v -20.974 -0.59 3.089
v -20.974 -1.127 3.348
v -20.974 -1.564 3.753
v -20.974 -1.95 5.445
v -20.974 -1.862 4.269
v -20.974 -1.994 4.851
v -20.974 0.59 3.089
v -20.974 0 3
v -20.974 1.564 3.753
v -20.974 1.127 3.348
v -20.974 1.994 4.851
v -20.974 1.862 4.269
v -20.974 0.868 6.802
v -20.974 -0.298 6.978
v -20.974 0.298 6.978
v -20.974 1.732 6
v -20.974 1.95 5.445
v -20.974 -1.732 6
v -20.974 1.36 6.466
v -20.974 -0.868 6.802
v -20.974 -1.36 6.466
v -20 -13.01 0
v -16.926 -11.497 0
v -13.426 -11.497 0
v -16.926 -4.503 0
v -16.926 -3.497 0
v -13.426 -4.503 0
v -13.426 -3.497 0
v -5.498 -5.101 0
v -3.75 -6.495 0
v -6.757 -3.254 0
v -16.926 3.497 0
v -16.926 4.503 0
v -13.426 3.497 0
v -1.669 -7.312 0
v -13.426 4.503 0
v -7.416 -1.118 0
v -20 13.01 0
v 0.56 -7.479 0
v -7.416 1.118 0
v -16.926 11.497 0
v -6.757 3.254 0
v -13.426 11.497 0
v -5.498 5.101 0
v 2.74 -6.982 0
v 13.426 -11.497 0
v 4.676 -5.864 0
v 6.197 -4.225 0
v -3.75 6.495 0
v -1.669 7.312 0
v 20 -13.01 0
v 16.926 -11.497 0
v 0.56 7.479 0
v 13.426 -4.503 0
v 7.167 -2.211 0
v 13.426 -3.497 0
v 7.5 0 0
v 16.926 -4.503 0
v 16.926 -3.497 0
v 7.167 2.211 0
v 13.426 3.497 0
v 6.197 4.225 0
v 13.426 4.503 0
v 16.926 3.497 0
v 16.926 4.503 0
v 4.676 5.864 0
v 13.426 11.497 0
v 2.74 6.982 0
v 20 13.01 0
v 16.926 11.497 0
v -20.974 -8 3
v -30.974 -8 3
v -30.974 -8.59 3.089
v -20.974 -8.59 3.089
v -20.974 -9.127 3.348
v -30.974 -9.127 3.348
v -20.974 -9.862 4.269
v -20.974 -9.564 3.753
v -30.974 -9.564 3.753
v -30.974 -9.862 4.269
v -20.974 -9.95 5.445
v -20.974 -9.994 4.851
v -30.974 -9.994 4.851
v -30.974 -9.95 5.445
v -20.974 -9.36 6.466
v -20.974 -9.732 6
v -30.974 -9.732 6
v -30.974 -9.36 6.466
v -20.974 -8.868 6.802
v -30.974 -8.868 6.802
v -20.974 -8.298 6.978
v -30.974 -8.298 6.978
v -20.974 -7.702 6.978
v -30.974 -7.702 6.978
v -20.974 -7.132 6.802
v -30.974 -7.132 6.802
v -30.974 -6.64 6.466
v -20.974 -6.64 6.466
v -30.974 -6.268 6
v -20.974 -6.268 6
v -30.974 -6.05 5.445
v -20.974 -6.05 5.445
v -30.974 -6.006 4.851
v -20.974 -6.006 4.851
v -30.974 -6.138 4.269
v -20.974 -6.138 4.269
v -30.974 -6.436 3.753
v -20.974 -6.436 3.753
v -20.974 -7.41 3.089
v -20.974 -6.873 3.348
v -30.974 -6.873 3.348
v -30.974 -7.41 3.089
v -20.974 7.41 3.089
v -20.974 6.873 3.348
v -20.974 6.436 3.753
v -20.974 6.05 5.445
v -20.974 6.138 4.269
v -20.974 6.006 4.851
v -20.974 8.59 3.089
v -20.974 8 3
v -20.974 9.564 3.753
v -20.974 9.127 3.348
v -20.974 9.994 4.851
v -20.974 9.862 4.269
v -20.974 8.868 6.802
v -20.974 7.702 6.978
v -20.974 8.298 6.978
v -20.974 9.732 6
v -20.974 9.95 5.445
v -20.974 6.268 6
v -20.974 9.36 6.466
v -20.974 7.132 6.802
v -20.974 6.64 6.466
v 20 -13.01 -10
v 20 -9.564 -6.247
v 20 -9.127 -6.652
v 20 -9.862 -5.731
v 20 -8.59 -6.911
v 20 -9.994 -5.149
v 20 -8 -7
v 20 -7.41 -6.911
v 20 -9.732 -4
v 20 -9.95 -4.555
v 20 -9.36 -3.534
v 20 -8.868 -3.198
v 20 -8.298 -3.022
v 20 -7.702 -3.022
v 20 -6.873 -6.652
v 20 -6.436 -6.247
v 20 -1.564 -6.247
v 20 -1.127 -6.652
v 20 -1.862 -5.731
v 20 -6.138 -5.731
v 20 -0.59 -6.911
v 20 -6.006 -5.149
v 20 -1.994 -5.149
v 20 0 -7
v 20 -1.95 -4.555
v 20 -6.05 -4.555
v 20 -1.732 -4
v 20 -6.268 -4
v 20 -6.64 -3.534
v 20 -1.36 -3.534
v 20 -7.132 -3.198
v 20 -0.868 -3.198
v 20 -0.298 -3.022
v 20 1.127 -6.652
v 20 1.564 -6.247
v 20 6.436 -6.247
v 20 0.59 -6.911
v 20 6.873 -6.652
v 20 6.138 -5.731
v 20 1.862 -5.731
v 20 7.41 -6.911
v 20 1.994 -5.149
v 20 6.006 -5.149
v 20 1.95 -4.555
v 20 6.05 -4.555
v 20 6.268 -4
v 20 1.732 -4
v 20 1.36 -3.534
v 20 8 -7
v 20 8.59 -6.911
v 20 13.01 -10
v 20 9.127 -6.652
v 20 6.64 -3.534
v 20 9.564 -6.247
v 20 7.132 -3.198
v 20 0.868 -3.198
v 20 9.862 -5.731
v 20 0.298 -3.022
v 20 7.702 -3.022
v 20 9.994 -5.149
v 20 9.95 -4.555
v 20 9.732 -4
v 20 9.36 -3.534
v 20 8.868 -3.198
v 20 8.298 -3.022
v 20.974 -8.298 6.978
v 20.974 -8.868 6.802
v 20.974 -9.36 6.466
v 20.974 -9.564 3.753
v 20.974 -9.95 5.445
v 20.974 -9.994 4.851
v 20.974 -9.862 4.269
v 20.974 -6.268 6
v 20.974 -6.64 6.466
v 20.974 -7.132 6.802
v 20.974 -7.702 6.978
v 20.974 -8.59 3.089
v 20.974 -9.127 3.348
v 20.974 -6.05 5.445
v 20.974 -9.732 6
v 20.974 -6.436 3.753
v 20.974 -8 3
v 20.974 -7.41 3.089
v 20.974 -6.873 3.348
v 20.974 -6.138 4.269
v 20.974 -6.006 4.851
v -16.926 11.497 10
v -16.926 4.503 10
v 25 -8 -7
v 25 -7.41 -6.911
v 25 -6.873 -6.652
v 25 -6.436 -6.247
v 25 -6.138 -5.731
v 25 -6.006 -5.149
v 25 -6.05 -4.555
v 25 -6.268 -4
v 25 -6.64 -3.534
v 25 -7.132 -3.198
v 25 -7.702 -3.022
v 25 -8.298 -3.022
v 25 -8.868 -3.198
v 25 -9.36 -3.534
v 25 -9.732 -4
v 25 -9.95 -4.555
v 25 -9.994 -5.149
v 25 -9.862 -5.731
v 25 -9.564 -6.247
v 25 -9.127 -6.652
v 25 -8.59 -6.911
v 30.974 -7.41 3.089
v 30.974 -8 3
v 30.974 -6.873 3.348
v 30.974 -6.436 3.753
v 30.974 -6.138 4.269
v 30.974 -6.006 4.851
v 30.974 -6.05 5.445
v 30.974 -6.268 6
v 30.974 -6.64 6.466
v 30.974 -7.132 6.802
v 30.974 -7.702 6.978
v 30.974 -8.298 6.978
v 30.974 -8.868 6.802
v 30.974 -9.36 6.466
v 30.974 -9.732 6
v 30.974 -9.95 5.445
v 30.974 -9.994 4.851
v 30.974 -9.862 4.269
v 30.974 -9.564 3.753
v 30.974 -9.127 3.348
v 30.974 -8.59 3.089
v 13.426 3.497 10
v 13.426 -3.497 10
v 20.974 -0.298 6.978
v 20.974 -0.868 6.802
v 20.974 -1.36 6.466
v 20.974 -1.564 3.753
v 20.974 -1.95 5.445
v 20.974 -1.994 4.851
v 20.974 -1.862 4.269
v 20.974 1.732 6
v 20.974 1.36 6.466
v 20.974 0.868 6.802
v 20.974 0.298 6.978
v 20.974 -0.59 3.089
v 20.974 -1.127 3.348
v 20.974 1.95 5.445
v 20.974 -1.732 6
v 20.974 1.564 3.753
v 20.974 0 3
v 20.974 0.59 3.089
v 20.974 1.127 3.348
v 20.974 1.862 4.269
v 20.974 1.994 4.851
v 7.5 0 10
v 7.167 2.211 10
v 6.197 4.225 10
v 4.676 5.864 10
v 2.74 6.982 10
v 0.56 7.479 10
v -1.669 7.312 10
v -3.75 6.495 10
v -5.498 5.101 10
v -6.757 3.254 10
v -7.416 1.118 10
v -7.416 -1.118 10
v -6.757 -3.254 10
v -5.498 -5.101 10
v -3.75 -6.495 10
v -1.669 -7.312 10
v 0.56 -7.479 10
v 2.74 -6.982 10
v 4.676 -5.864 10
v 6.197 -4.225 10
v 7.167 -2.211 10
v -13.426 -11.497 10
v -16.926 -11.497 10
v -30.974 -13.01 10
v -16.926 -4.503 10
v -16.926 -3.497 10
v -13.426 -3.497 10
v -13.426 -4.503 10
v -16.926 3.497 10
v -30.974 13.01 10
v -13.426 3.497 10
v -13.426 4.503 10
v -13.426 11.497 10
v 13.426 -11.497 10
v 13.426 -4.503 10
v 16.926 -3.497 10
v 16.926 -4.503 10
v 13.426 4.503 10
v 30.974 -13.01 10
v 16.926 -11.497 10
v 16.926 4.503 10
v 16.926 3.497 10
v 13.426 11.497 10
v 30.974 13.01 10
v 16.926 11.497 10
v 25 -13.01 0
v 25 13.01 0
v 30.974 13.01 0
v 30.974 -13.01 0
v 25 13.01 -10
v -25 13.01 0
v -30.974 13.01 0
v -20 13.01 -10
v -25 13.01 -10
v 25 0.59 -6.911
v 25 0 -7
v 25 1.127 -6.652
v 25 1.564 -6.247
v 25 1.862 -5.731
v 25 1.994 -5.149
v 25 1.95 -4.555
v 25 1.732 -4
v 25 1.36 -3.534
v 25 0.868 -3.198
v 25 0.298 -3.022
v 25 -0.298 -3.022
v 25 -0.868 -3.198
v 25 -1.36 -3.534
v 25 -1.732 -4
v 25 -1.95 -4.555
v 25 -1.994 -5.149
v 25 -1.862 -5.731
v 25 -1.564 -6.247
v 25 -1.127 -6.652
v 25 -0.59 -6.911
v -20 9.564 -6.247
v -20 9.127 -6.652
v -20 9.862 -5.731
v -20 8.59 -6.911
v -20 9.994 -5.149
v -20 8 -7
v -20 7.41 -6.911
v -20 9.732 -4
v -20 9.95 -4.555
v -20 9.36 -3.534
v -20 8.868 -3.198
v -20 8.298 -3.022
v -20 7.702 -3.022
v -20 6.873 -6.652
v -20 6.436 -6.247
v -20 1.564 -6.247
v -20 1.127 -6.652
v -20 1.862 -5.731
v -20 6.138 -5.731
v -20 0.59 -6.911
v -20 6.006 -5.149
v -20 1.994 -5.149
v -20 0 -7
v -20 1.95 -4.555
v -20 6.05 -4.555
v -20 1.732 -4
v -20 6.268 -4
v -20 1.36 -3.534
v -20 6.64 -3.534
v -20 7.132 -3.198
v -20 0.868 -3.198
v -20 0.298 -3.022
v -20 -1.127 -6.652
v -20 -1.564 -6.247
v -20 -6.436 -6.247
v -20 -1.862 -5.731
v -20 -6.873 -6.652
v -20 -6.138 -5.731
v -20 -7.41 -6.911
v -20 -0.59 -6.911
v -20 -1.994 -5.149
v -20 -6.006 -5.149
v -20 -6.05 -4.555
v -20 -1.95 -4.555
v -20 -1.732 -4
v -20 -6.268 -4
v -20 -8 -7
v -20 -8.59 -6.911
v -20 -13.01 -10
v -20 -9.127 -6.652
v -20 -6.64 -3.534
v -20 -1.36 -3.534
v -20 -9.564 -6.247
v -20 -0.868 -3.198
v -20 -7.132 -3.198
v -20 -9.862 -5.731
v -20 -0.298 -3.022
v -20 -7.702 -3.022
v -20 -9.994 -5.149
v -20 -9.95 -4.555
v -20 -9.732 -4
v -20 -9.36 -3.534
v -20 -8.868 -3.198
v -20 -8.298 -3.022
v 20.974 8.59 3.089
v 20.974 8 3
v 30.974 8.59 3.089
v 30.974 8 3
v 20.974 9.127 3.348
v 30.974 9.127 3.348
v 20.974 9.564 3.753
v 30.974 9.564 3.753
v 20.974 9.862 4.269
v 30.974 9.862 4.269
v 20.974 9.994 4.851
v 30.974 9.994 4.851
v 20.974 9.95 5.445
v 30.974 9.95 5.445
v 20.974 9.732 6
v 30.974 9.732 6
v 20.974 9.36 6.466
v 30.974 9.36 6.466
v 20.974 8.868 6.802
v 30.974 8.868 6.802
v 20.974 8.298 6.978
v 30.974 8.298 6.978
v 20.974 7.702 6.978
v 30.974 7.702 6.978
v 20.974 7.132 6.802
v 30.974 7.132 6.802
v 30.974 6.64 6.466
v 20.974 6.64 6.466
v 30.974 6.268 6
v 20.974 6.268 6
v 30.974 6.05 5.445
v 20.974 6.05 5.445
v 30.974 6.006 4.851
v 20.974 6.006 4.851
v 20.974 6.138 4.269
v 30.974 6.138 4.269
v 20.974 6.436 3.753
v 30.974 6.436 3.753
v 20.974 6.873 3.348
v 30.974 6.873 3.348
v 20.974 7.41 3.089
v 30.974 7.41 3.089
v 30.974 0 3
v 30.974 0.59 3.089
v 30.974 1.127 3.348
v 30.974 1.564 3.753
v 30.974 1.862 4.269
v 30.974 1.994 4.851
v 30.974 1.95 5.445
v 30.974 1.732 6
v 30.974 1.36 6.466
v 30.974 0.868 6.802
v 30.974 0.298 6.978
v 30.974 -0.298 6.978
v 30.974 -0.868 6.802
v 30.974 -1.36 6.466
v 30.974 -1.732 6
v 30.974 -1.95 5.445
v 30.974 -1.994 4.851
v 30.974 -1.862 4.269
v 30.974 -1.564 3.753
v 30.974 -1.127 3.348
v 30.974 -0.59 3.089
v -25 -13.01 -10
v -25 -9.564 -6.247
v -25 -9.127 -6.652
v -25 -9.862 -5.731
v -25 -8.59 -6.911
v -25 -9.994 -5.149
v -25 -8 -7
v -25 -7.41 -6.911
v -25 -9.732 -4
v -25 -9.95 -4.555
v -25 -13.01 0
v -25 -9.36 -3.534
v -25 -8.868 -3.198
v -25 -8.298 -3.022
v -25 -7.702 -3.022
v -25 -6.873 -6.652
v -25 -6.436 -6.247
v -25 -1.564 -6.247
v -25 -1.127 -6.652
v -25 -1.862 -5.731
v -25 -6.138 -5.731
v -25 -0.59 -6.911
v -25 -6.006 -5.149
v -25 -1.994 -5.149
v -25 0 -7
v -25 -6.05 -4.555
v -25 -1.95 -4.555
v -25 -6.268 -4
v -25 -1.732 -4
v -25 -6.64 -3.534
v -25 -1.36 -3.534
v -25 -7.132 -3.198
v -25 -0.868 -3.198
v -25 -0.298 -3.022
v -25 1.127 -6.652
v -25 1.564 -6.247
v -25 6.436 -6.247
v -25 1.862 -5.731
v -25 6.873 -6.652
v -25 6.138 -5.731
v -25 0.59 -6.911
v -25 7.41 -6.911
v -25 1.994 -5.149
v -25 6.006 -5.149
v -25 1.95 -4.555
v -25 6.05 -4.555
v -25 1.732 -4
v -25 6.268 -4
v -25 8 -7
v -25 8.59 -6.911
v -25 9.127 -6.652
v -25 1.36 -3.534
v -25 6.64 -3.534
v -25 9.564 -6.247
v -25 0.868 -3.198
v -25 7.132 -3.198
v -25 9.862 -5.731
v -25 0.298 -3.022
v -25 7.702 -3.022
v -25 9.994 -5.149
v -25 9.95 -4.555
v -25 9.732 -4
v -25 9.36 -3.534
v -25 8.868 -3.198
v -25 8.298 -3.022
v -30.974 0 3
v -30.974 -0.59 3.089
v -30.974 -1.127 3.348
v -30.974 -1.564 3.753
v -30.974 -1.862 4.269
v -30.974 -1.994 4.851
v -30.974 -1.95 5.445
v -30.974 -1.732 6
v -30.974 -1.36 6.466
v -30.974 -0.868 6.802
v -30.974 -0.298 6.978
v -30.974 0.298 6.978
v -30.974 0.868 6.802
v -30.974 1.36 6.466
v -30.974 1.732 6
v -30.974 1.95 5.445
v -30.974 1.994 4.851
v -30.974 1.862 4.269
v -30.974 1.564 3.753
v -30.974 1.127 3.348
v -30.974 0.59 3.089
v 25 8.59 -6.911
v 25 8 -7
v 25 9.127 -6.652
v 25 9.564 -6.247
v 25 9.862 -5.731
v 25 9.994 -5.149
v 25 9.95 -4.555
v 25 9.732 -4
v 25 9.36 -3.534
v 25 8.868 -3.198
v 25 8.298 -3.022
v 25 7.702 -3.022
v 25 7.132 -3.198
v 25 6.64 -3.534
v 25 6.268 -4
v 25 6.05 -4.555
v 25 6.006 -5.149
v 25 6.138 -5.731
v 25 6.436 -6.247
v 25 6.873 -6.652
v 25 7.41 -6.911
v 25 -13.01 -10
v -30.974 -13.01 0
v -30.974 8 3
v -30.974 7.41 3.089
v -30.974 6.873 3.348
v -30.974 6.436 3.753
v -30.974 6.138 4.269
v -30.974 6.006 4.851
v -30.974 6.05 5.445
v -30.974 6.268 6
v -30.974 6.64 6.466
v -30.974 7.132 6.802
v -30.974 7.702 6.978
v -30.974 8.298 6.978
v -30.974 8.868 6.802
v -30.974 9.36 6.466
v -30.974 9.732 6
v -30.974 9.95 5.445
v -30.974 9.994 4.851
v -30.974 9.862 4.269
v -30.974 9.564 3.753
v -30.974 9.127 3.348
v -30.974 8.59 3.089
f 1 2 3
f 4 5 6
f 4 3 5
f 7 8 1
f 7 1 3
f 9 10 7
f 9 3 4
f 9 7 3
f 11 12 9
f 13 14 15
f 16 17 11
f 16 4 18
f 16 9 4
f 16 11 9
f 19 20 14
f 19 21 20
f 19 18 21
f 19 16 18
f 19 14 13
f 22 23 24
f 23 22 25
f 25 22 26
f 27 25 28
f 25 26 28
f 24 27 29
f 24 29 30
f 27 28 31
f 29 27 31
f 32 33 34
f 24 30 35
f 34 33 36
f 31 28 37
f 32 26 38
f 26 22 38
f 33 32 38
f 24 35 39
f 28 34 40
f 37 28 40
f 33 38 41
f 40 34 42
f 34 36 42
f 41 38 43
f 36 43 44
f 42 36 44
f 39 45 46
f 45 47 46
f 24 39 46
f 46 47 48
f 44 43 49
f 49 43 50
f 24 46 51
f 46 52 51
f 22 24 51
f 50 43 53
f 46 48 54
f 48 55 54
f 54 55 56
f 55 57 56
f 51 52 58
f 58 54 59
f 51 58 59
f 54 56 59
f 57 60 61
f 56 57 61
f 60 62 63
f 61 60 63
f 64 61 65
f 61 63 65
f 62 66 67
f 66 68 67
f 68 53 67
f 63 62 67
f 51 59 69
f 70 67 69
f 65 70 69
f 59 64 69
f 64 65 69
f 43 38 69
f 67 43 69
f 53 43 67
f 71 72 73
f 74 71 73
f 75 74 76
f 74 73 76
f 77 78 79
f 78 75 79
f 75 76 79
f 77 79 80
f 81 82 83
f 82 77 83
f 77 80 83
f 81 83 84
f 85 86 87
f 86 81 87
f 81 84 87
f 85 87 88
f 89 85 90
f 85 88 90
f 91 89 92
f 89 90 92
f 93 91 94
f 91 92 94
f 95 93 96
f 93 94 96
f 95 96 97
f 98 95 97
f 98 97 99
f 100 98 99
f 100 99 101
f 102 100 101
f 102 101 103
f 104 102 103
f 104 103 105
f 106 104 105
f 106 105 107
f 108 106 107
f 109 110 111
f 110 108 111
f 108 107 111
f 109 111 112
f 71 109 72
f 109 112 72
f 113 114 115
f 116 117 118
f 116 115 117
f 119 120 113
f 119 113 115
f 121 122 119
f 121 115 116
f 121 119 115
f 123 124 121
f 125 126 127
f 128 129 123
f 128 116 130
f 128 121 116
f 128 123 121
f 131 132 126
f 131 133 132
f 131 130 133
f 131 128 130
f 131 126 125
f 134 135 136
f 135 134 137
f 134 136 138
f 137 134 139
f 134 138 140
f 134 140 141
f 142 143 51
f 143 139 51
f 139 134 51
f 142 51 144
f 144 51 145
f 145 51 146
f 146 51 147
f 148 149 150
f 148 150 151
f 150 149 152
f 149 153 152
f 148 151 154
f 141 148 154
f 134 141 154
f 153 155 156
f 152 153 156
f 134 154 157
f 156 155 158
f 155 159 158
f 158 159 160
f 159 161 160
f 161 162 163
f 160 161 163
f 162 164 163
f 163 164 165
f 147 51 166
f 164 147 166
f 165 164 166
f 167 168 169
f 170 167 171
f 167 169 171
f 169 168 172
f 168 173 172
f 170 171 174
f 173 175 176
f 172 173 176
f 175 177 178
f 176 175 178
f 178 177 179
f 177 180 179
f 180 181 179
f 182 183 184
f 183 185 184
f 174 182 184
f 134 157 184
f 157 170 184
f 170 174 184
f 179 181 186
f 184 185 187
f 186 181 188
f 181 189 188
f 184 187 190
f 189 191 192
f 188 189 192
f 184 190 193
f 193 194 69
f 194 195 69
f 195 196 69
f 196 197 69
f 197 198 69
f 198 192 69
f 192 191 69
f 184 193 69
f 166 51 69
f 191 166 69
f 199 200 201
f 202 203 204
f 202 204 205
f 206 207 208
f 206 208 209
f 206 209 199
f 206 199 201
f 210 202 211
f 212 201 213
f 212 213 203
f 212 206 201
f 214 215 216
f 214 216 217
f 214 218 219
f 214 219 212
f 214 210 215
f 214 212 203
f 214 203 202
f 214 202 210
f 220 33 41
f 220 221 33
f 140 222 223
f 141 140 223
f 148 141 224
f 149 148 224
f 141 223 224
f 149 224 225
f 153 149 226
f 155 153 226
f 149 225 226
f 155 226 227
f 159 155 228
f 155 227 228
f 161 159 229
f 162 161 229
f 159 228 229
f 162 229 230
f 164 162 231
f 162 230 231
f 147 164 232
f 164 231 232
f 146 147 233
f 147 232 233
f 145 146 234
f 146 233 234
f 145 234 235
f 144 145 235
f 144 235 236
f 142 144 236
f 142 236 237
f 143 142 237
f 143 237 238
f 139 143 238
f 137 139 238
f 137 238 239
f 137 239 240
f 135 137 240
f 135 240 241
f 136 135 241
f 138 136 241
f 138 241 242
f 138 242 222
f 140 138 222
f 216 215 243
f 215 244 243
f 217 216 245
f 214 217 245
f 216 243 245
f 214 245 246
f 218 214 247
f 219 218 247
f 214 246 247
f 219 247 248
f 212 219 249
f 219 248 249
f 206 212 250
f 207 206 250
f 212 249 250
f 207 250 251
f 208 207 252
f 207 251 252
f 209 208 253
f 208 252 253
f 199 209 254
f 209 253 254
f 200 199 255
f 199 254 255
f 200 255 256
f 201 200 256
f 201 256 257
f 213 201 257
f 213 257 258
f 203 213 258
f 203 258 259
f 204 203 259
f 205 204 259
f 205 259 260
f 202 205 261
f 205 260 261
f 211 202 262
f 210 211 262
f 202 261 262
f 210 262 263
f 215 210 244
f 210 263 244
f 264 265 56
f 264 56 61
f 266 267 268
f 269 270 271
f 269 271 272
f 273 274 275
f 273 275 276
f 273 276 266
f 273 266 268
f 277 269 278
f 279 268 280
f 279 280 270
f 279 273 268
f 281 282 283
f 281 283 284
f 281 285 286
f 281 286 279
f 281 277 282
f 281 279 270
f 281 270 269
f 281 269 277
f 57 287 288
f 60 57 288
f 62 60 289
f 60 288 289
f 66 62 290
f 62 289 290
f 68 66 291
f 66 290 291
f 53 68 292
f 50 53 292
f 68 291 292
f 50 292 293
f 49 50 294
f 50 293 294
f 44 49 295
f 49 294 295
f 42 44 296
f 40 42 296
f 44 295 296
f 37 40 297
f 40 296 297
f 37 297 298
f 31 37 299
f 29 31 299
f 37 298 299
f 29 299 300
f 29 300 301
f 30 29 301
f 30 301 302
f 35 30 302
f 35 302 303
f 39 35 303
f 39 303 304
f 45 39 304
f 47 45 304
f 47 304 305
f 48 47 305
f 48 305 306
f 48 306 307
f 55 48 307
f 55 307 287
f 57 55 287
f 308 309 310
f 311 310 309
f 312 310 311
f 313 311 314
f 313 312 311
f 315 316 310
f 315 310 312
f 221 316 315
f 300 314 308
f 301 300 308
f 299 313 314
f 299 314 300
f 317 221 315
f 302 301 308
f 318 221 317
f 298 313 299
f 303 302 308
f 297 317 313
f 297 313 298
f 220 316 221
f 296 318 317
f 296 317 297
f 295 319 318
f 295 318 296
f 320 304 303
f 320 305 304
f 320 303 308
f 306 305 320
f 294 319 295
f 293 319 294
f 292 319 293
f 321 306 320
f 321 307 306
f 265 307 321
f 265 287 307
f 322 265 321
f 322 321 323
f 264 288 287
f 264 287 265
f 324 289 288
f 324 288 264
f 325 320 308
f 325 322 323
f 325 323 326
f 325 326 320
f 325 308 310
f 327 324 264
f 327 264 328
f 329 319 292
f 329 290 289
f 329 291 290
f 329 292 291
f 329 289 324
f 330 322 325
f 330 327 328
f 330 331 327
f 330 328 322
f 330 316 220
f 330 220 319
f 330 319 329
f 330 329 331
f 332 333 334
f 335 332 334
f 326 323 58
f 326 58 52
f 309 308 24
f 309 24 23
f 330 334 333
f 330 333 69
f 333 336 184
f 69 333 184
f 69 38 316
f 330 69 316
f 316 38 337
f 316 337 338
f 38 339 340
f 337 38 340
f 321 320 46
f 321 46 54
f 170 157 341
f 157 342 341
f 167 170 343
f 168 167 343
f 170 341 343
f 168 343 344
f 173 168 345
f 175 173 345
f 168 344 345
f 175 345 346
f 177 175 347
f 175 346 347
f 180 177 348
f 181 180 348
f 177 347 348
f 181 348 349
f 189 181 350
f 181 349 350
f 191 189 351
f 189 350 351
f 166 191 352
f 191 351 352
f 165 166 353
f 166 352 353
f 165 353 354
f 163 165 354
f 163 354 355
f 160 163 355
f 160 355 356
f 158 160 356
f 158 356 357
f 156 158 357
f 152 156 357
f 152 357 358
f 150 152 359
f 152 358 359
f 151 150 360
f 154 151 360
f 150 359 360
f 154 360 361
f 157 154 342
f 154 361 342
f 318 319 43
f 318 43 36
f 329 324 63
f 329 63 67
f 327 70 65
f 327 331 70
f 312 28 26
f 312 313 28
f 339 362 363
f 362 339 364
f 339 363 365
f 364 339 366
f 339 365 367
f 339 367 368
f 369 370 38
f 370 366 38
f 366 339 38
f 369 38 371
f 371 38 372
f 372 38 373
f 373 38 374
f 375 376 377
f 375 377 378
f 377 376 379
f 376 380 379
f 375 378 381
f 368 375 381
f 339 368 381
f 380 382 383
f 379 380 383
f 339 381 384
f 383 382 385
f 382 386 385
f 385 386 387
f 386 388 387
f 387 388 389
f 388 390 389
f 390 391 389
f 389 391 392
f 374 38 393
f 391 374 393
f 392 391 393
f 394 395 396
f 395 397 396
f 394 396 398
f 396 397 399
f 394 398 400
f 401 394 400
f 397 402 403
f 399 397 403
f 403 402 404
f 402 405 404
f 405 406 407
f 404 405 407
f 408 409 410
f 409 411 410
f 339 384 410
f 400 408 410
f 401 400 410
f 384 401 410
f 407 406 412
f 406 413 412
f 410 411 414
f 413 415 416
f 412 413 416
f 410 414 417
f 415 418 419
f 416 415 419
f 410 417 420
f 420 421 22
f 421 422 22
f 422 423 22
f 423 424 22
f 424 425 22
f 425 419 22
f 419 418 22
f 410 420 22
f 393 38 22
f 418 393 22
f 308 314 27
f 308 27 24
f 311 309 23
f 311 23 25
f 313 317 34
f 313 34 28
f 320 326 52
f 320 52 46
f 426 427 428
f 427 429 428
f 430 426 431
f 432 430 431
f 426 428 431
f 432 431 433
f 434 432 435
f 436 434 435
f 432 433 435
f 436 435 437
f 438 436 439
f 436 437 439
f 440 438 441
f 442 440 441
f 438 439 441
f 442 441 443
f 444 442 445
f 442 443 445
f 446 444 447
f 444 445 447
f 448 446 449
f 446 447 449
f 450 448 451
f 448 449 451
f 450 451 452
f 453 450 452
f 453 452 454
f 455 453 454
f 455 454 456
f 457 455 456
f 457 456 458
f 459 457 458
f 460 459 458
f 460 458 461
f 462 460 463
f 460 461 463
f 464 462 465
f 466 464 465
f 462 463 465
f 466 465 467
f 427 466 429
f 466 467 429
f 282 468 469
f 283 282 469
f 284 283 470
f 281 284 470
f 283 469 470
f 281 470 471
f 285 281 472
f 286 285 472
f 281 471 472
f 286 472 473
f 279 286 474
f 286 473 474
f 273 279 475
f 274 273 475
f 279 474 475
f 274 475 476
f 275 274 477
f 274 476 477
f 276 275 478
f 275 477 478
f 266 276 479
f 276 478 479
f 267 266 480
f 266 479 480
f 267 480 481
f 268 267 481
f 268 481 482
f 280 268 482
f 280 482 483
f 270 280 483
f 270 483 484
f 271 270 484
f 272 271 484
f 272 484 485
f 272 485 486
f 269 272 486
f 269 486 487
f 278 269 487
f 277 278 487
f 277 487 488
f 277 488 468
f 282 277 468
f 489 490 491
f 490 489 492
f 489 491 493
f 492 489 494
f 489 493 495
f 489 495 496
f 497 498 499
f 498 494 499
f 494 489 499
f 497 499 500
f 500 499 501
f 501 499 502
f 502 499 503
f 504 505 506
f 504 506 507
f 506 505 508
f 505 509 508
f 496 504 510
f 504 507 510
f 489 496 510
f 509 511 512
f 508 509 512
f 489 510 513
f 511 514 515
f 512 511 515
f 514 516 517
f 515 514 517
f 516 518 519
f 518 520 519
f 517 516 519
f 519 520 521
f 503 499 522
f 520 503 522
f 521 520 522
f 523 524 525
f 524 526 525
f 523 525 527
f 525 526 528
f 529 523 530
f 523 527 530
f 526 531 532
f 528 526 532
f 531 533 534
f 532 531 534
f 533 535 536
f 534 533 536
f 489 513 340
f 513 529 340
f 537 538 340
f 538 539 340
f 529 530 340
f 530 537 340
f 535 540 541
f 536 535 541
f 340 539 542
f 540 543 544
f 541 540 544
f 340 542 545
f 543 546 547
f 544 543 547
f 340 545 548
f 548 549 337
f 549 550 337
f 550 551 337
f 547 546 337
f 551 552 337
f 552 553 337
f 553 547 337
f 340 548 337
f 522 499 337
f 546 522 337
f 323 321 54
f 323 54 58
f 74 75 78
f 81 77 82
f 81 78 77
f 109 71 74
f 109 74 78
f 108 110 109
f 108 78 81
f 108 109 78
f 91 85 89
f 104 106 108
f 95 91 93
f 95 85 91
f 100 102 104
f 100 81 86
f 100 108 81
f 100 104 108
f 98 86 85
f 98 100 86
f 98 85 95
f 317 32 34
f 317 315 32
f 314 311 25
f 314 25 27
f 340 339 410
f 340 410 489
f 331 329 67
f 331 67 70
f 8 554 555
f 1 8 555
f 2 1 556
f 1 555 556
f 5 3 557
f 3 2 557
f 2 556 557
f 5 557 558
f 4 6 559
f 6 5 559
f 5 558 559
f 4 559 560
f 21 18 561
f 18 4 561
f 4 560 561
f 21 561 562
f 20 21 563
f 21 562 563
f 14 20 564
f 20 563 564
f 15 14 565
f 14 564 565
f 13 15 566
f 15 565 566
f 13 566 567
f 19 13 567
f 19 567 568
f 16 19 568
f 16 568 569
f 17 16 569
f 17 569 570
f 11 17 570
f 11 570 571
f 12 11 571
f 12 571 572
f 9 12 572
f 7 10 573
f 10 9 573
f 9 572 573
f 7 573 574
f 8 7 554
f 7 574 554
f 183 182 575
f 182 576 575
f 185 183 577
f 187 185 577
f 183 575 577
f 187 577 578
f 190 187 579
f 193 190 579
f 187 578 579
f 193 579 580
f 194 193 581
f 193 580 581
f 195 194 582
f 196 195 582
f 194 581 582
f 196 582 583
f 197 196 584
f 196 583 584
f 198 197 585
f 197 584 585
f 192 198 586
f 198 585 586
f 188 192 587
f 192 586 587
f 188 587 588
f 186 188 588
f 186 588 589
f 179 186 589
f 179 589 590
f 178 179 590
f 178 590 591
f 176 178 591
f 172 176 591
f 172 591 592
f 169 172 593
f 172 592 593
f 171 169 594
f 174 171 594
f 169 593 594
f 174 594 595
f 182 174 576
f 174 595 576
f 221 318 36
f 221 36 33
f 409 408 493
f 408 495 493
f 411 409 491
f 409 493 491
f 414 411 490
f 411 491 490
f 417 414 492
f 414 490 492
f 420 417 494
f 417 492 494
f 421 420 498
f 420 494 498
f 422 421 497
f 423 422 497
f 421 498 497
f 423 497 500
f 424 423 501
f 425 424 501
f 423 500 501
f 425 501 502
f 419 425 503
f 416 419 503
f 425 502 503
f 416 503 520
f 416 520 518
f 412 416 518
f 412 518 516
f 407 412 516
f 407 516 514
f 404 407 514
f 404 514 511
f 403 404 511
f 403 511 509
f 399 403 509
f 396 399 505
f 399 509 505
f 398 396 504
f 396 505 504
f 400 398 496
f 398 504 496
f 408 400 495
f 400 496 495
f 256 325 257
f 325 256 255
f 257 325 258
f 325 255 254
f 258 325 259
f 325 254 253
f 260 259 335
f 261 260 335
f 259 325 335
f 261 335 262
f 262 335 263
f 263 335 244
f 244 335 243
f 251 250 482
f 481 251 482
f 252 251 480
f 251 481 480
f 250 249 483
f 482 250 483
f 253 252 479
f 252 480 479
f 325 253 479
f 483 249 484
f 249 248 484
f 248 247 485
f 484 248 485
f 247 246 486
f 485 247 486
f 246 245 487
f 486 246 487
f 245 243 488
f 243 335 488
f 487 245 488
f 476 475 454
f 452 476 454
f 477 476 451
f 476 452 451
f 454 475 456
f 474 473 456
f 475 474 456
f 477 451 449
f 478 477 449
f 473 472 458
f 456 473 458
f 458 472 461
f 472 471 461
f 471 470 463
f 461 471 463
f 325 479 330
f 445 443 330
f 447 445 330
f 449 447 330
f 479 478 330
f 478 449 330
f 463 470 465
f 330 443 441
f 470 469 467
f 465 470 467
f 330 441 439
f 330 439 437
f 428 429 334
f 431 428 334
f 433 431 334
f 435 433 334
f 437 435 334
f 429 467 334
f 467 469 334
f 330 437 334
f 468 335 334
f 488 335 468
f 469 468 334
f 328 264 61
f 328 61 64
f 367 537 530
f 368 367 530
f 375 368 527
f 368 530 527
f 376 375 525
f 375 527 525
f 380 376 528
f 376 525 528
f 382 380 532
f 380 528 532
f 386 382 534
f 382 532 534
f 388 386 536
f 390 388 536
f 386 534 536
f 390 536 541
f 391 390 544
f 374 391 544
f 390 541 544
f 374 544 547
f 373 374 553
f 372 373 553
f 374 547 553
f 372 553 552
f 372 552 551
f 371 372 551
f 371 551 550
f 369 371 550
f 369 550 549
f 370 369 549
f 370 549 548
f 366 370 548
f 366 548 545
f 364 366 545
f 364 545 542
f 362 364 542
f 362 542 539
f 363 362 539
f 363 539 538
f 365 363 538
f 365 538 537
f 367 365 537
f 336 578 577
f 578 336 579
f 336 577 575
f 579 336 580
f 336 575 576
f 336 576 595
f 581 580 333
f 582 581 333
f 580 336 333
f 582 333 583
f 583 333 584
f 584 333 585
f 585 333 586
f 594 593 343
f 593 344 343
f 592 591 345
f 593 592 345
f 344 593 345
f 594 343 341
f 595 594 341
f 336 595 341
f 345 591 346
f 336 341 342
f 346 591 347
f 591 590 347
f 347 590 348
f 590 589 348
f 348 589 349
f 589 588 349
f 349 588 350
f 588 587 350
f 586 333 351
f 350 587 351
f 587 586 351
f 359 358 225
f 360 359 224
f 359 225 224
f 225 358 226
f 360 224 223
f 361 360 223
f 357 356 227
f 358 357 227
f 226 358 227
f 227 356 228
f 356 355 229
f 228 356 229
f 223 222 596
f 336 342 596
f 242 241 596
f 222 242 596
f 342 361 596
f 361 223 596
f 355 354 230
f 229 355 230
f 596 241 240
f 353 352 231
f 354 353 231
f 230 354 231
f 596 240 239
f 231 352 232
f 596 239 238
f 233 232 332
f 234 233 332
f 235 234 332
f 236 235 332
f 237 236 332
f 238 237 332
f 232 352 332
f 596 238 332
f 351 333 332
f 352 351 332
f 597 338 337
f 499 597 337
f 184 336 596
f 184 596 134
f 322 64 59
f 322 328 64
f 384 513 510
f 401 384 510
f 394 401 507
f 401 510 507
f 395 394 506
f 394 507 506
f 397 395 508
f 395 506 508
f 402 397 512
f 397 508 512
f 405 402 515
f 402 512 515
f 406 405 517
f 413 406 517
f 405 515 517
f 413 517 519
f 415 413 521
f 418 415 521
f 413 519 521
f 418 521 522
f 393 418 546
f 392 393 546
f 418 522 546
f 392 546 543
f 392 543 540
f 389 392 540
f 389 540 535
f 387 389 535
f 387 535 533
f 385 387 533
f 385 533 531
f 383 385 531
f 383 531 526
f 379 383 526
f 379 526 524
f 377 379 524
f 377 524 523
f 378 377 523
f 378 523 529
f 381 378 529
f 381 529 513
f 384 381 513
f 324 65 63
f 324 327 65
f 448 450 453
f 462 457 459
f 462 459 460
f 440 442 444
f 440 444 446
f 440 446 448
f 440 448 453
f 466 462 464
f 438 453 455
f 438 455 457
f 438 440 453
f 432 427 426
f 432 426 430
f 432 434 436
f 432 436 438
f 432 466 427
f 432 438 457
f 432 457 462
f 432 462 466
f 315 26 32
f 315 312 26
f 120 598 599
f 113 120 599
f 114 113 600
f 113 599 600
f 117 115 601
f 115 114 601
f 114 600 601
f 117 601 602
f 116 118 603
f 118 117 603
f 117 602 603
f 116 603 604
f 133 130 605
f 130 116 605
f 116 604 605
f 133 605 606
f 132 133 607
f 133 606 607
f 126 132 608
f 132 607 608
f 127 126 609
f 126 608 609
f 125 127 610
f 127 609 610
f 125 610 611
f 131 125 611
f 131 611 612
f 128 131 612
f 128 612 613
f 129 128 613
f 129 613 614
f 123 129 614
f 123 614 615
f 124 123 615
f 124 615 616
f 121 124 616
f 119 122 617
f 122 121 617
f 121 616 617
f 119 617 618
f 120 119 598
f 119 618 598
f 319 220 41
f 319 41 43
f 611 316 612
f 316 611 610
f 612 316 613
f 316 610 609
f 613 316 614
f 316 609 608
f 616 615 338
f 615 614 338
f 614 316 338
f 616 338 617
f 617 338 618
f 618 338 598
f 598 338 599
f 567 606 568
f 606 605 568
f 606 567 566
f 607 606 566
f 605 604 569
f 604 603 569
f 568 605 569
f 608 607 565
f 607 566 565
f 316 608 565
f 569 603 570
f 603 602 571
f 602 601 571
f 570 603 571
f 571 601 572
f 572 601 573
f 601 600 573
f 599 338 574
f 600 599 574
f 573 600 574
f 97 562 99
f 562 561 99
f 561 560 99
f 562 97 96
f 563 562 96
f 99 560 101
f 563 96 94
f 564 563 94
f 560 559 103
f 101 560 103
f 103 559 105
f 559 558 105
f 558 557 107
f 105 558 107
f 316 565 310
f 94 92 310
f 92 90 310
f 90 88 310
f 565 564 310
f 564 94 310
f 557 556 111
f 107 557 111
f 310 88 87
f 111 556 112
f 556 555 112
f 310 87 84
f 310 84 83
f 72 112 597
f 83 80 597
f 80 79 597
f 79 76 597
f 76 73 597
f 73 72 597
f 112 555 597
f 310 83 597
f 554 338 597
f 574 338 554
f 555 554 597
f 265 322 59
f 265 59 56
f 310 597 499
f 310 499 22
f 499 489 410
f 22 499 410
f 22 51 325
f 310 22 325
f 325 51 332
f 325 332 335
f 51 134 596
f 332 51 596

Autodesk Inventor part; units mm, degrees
ref_plane "YZ Plane" through (0, 0, 0) normal (1, 0, 0) x (0, 1, 0)
ref_plane "XZ Plane" through (0, 0, 0) normal (0, 1, 0) x (-1, 0, 0)
ref_plane "XY Plane" through (0, 0, 0) normal (0, 0, 1) x (1, 0, 0)
sketch "Эскиз1" plane through (0, 0, 0) normal (0, 0, 1) x (1, 0, 0)
  line L0 (-30.974, -13.01) -> (30.974, -13.01)
  line L1 (30.974, -13.01) -> (30.974, 13.01)
  line L2 (30.974, 13.01) -> (-30.974, 13.01)
  line L3 (-30.974, 13.01) -> (-30.974, -13.01)
  line L4 (-30.974, -13.01) -> (30.974, 13.01) construction
  line L5 (30.974, -13.01) -> (-30.974, 13.01) construction
  point P0 (0, 0)
  dimension "d0" = 61.948
  dimension "d1" = 26.02
extrude "Выдавливание1" add sketch "Эскиз1" along normal blind 10
sketch "Эскиз2" plane through (30.974, -13.01, 0) normal (1, 0, 0) x (0, 0, -1)
  line L0 (0, 13.01) -> (-5, 13.01)
  circle A0 centre (-5, 13.01) radius 2
  dimension "d4" = 5
  dimension "d5" = 4
extrude "Выдавливание2" cut sketch "Эскиз2" against normal blind 10
pattern_linear "Прямоуг.массив1" count 3 spacing 8 along (0, 1, 0) of "Выдавливание2" first direction both ways yes
mirror "Зеркальное отражение1" about plane through (0, 0, 0) normal (1, 0, 0) of "Выдавливание2", "Прямоуг.массив1"
sketch "Эскиз3" plane through (0, 0, 0) normal (0, 0, -1) x (-1, 0, 0)
  line L0 (0, 0) -> (-20, 0)
  line L1 (-30.974, 13.01) -> (30.974, 13.01) projected
  line L2 (30.974, -13.01) -> (-30.974, -13.01) projected
  line L3 (-20, 13.01) -> (-25, 13.01)
  line L4 (-25, 13.01) -> (-25, -13.01)
  line L5 (-25, -13.01) -> (-20, -13.01)
  line L6 (-20, -13.01) -> (-20, 13.01)
  line L7 (-30.974, -13.01) -> (-30.974, 13.01) projected
  dimension "d11" = 20
  dimension "d12" = 5
extrude "Выдавливание3" add sketch "Эскиз3" along normal blind 10 contours L1 L6 L2 L4
sketch "Эскиз4" plane through (25, -13.01, 0) normal (1, 0, 0) x (0, 0, -1)
  line L0 (10, 26.02) -> (10, 0) projected
  line L1 (10, 13.01) -> (5, 13.01)
  circle A0 centre (5, 13.01) radius 2
  point P0 (0, 13.01)
  dimension "d16" = 5
  dimension "d17" = 4
extrude "Выдавливание4" cut sketch "Эскиз4" against normal blind 10
pattern_linear "Прямоуг.массив2" count 3 spacing 8 along (0, -1, 0) of "Выдавливание4" first direction both ways yes
mirror "Зеркальное отражение2" about plane through (0, 0, 0) normal (1, 0, 0) of "Выдавливание3", "Выдавливание4", "Прямоуг.массив2"
sketch "Эскиз5" plane through (0, 0, 10) normal (0, 0, 1) x (1, 0, 0)
  circle A0 centre (0, 0) radius 7.5
  dimension "d23" = 15
extrude "Выдавливание5" cut sketch "Эскиз5" against normal blind 23.75
sketch "Эскиз6" plane through (0, 0, 10) normal (0, 0, 1) x (1, 0, 0)
  circle A0 centre (0, 0) radius 5
  line L0 (-13.4261, 4.5029) -> (-16.9261, 4.5029)
  line L1 (-16.9261, 4.5029) -> (-16.9261, 11.4971)
  line L2 (-16.9261, 11.4971) -> (-13.4261, 11.4971)
  line L3 (-13.4261, 11.4971) -> (-13.4261, 4.5029)
  line L4 (-13.4261, -11.4971) -> (-16.9261, -11.4971)
  line L5 (-16.9261, -11.4971) -> (-16.9261, -4.5029)
  line L6 (-16.9261, -4.5029) -> (-13.4261, -4.5029)
  line L7 (-13.4261, -4.5029) -> (-13.4261, -11.4971)
  line L8 (-13.4261, -3.4971) -> (-16.9261, -3.4971)
  line L9 (-16.9261, -3.4971) -> (-16.9261, 3.4971)
  line L10 (-16.9261, 3.4971) -> (-13.4261, 3.4971)
  line L11 (-13.4261, 3.4971) -> (-13.4261, -3.4971)
  line L12 (10.5, 4.5029) -> (7, 4.5029)
  line L13 (7, 4.5029) -> (7, 11.4971)
  line L14 (7, 11.4971) -> (10.5, 11.4971)
  line L15 (10.5, 11.4971) -> (10.5, 4.5029)
  line L16 (10.5, -11.4971) -> (7, -11.4971)
  line L17 (7, -11.4971) -> (7, -4.5029)
  line L18 (7, -4.5029) -> (10.5, -4.5029)
  line L19 (10.5, -4.5029) -> (10.5, -11.4971)
  line L20 (7, 3.4971) -> (10.5, 3.4971)
  line L21 (10.5, 3.4971) -> (10.5, -3.4971)
  line L22 (10.5, -3.4971) -> (7, -3.4971)
  line L23 (7, -3.4971) -> (7, 3.4971)
  line L24 (17, -13.1) -> (17, 13.1)
  line L25 (17, 13.1) -> (-17, 13.1)
  line L26 (-17, 13.1) -> (-17, -13.1)
  line L27 (-17, -13.1) -> (17, -13.1)
extrude "Выдавливание6" cut sketch "Эскиз6" against normal blind 10 contours L0 L1 L2 L3 | L4 L5 L6 L7 | L8 L9 L10 L11
mirror "Зеркальное отражение3" about plane through (0, 0, 0) normal (1, 0, 0) of "Выдавливание6"
properties part number "000.404 - Переходник" material "Пластик АБС"
